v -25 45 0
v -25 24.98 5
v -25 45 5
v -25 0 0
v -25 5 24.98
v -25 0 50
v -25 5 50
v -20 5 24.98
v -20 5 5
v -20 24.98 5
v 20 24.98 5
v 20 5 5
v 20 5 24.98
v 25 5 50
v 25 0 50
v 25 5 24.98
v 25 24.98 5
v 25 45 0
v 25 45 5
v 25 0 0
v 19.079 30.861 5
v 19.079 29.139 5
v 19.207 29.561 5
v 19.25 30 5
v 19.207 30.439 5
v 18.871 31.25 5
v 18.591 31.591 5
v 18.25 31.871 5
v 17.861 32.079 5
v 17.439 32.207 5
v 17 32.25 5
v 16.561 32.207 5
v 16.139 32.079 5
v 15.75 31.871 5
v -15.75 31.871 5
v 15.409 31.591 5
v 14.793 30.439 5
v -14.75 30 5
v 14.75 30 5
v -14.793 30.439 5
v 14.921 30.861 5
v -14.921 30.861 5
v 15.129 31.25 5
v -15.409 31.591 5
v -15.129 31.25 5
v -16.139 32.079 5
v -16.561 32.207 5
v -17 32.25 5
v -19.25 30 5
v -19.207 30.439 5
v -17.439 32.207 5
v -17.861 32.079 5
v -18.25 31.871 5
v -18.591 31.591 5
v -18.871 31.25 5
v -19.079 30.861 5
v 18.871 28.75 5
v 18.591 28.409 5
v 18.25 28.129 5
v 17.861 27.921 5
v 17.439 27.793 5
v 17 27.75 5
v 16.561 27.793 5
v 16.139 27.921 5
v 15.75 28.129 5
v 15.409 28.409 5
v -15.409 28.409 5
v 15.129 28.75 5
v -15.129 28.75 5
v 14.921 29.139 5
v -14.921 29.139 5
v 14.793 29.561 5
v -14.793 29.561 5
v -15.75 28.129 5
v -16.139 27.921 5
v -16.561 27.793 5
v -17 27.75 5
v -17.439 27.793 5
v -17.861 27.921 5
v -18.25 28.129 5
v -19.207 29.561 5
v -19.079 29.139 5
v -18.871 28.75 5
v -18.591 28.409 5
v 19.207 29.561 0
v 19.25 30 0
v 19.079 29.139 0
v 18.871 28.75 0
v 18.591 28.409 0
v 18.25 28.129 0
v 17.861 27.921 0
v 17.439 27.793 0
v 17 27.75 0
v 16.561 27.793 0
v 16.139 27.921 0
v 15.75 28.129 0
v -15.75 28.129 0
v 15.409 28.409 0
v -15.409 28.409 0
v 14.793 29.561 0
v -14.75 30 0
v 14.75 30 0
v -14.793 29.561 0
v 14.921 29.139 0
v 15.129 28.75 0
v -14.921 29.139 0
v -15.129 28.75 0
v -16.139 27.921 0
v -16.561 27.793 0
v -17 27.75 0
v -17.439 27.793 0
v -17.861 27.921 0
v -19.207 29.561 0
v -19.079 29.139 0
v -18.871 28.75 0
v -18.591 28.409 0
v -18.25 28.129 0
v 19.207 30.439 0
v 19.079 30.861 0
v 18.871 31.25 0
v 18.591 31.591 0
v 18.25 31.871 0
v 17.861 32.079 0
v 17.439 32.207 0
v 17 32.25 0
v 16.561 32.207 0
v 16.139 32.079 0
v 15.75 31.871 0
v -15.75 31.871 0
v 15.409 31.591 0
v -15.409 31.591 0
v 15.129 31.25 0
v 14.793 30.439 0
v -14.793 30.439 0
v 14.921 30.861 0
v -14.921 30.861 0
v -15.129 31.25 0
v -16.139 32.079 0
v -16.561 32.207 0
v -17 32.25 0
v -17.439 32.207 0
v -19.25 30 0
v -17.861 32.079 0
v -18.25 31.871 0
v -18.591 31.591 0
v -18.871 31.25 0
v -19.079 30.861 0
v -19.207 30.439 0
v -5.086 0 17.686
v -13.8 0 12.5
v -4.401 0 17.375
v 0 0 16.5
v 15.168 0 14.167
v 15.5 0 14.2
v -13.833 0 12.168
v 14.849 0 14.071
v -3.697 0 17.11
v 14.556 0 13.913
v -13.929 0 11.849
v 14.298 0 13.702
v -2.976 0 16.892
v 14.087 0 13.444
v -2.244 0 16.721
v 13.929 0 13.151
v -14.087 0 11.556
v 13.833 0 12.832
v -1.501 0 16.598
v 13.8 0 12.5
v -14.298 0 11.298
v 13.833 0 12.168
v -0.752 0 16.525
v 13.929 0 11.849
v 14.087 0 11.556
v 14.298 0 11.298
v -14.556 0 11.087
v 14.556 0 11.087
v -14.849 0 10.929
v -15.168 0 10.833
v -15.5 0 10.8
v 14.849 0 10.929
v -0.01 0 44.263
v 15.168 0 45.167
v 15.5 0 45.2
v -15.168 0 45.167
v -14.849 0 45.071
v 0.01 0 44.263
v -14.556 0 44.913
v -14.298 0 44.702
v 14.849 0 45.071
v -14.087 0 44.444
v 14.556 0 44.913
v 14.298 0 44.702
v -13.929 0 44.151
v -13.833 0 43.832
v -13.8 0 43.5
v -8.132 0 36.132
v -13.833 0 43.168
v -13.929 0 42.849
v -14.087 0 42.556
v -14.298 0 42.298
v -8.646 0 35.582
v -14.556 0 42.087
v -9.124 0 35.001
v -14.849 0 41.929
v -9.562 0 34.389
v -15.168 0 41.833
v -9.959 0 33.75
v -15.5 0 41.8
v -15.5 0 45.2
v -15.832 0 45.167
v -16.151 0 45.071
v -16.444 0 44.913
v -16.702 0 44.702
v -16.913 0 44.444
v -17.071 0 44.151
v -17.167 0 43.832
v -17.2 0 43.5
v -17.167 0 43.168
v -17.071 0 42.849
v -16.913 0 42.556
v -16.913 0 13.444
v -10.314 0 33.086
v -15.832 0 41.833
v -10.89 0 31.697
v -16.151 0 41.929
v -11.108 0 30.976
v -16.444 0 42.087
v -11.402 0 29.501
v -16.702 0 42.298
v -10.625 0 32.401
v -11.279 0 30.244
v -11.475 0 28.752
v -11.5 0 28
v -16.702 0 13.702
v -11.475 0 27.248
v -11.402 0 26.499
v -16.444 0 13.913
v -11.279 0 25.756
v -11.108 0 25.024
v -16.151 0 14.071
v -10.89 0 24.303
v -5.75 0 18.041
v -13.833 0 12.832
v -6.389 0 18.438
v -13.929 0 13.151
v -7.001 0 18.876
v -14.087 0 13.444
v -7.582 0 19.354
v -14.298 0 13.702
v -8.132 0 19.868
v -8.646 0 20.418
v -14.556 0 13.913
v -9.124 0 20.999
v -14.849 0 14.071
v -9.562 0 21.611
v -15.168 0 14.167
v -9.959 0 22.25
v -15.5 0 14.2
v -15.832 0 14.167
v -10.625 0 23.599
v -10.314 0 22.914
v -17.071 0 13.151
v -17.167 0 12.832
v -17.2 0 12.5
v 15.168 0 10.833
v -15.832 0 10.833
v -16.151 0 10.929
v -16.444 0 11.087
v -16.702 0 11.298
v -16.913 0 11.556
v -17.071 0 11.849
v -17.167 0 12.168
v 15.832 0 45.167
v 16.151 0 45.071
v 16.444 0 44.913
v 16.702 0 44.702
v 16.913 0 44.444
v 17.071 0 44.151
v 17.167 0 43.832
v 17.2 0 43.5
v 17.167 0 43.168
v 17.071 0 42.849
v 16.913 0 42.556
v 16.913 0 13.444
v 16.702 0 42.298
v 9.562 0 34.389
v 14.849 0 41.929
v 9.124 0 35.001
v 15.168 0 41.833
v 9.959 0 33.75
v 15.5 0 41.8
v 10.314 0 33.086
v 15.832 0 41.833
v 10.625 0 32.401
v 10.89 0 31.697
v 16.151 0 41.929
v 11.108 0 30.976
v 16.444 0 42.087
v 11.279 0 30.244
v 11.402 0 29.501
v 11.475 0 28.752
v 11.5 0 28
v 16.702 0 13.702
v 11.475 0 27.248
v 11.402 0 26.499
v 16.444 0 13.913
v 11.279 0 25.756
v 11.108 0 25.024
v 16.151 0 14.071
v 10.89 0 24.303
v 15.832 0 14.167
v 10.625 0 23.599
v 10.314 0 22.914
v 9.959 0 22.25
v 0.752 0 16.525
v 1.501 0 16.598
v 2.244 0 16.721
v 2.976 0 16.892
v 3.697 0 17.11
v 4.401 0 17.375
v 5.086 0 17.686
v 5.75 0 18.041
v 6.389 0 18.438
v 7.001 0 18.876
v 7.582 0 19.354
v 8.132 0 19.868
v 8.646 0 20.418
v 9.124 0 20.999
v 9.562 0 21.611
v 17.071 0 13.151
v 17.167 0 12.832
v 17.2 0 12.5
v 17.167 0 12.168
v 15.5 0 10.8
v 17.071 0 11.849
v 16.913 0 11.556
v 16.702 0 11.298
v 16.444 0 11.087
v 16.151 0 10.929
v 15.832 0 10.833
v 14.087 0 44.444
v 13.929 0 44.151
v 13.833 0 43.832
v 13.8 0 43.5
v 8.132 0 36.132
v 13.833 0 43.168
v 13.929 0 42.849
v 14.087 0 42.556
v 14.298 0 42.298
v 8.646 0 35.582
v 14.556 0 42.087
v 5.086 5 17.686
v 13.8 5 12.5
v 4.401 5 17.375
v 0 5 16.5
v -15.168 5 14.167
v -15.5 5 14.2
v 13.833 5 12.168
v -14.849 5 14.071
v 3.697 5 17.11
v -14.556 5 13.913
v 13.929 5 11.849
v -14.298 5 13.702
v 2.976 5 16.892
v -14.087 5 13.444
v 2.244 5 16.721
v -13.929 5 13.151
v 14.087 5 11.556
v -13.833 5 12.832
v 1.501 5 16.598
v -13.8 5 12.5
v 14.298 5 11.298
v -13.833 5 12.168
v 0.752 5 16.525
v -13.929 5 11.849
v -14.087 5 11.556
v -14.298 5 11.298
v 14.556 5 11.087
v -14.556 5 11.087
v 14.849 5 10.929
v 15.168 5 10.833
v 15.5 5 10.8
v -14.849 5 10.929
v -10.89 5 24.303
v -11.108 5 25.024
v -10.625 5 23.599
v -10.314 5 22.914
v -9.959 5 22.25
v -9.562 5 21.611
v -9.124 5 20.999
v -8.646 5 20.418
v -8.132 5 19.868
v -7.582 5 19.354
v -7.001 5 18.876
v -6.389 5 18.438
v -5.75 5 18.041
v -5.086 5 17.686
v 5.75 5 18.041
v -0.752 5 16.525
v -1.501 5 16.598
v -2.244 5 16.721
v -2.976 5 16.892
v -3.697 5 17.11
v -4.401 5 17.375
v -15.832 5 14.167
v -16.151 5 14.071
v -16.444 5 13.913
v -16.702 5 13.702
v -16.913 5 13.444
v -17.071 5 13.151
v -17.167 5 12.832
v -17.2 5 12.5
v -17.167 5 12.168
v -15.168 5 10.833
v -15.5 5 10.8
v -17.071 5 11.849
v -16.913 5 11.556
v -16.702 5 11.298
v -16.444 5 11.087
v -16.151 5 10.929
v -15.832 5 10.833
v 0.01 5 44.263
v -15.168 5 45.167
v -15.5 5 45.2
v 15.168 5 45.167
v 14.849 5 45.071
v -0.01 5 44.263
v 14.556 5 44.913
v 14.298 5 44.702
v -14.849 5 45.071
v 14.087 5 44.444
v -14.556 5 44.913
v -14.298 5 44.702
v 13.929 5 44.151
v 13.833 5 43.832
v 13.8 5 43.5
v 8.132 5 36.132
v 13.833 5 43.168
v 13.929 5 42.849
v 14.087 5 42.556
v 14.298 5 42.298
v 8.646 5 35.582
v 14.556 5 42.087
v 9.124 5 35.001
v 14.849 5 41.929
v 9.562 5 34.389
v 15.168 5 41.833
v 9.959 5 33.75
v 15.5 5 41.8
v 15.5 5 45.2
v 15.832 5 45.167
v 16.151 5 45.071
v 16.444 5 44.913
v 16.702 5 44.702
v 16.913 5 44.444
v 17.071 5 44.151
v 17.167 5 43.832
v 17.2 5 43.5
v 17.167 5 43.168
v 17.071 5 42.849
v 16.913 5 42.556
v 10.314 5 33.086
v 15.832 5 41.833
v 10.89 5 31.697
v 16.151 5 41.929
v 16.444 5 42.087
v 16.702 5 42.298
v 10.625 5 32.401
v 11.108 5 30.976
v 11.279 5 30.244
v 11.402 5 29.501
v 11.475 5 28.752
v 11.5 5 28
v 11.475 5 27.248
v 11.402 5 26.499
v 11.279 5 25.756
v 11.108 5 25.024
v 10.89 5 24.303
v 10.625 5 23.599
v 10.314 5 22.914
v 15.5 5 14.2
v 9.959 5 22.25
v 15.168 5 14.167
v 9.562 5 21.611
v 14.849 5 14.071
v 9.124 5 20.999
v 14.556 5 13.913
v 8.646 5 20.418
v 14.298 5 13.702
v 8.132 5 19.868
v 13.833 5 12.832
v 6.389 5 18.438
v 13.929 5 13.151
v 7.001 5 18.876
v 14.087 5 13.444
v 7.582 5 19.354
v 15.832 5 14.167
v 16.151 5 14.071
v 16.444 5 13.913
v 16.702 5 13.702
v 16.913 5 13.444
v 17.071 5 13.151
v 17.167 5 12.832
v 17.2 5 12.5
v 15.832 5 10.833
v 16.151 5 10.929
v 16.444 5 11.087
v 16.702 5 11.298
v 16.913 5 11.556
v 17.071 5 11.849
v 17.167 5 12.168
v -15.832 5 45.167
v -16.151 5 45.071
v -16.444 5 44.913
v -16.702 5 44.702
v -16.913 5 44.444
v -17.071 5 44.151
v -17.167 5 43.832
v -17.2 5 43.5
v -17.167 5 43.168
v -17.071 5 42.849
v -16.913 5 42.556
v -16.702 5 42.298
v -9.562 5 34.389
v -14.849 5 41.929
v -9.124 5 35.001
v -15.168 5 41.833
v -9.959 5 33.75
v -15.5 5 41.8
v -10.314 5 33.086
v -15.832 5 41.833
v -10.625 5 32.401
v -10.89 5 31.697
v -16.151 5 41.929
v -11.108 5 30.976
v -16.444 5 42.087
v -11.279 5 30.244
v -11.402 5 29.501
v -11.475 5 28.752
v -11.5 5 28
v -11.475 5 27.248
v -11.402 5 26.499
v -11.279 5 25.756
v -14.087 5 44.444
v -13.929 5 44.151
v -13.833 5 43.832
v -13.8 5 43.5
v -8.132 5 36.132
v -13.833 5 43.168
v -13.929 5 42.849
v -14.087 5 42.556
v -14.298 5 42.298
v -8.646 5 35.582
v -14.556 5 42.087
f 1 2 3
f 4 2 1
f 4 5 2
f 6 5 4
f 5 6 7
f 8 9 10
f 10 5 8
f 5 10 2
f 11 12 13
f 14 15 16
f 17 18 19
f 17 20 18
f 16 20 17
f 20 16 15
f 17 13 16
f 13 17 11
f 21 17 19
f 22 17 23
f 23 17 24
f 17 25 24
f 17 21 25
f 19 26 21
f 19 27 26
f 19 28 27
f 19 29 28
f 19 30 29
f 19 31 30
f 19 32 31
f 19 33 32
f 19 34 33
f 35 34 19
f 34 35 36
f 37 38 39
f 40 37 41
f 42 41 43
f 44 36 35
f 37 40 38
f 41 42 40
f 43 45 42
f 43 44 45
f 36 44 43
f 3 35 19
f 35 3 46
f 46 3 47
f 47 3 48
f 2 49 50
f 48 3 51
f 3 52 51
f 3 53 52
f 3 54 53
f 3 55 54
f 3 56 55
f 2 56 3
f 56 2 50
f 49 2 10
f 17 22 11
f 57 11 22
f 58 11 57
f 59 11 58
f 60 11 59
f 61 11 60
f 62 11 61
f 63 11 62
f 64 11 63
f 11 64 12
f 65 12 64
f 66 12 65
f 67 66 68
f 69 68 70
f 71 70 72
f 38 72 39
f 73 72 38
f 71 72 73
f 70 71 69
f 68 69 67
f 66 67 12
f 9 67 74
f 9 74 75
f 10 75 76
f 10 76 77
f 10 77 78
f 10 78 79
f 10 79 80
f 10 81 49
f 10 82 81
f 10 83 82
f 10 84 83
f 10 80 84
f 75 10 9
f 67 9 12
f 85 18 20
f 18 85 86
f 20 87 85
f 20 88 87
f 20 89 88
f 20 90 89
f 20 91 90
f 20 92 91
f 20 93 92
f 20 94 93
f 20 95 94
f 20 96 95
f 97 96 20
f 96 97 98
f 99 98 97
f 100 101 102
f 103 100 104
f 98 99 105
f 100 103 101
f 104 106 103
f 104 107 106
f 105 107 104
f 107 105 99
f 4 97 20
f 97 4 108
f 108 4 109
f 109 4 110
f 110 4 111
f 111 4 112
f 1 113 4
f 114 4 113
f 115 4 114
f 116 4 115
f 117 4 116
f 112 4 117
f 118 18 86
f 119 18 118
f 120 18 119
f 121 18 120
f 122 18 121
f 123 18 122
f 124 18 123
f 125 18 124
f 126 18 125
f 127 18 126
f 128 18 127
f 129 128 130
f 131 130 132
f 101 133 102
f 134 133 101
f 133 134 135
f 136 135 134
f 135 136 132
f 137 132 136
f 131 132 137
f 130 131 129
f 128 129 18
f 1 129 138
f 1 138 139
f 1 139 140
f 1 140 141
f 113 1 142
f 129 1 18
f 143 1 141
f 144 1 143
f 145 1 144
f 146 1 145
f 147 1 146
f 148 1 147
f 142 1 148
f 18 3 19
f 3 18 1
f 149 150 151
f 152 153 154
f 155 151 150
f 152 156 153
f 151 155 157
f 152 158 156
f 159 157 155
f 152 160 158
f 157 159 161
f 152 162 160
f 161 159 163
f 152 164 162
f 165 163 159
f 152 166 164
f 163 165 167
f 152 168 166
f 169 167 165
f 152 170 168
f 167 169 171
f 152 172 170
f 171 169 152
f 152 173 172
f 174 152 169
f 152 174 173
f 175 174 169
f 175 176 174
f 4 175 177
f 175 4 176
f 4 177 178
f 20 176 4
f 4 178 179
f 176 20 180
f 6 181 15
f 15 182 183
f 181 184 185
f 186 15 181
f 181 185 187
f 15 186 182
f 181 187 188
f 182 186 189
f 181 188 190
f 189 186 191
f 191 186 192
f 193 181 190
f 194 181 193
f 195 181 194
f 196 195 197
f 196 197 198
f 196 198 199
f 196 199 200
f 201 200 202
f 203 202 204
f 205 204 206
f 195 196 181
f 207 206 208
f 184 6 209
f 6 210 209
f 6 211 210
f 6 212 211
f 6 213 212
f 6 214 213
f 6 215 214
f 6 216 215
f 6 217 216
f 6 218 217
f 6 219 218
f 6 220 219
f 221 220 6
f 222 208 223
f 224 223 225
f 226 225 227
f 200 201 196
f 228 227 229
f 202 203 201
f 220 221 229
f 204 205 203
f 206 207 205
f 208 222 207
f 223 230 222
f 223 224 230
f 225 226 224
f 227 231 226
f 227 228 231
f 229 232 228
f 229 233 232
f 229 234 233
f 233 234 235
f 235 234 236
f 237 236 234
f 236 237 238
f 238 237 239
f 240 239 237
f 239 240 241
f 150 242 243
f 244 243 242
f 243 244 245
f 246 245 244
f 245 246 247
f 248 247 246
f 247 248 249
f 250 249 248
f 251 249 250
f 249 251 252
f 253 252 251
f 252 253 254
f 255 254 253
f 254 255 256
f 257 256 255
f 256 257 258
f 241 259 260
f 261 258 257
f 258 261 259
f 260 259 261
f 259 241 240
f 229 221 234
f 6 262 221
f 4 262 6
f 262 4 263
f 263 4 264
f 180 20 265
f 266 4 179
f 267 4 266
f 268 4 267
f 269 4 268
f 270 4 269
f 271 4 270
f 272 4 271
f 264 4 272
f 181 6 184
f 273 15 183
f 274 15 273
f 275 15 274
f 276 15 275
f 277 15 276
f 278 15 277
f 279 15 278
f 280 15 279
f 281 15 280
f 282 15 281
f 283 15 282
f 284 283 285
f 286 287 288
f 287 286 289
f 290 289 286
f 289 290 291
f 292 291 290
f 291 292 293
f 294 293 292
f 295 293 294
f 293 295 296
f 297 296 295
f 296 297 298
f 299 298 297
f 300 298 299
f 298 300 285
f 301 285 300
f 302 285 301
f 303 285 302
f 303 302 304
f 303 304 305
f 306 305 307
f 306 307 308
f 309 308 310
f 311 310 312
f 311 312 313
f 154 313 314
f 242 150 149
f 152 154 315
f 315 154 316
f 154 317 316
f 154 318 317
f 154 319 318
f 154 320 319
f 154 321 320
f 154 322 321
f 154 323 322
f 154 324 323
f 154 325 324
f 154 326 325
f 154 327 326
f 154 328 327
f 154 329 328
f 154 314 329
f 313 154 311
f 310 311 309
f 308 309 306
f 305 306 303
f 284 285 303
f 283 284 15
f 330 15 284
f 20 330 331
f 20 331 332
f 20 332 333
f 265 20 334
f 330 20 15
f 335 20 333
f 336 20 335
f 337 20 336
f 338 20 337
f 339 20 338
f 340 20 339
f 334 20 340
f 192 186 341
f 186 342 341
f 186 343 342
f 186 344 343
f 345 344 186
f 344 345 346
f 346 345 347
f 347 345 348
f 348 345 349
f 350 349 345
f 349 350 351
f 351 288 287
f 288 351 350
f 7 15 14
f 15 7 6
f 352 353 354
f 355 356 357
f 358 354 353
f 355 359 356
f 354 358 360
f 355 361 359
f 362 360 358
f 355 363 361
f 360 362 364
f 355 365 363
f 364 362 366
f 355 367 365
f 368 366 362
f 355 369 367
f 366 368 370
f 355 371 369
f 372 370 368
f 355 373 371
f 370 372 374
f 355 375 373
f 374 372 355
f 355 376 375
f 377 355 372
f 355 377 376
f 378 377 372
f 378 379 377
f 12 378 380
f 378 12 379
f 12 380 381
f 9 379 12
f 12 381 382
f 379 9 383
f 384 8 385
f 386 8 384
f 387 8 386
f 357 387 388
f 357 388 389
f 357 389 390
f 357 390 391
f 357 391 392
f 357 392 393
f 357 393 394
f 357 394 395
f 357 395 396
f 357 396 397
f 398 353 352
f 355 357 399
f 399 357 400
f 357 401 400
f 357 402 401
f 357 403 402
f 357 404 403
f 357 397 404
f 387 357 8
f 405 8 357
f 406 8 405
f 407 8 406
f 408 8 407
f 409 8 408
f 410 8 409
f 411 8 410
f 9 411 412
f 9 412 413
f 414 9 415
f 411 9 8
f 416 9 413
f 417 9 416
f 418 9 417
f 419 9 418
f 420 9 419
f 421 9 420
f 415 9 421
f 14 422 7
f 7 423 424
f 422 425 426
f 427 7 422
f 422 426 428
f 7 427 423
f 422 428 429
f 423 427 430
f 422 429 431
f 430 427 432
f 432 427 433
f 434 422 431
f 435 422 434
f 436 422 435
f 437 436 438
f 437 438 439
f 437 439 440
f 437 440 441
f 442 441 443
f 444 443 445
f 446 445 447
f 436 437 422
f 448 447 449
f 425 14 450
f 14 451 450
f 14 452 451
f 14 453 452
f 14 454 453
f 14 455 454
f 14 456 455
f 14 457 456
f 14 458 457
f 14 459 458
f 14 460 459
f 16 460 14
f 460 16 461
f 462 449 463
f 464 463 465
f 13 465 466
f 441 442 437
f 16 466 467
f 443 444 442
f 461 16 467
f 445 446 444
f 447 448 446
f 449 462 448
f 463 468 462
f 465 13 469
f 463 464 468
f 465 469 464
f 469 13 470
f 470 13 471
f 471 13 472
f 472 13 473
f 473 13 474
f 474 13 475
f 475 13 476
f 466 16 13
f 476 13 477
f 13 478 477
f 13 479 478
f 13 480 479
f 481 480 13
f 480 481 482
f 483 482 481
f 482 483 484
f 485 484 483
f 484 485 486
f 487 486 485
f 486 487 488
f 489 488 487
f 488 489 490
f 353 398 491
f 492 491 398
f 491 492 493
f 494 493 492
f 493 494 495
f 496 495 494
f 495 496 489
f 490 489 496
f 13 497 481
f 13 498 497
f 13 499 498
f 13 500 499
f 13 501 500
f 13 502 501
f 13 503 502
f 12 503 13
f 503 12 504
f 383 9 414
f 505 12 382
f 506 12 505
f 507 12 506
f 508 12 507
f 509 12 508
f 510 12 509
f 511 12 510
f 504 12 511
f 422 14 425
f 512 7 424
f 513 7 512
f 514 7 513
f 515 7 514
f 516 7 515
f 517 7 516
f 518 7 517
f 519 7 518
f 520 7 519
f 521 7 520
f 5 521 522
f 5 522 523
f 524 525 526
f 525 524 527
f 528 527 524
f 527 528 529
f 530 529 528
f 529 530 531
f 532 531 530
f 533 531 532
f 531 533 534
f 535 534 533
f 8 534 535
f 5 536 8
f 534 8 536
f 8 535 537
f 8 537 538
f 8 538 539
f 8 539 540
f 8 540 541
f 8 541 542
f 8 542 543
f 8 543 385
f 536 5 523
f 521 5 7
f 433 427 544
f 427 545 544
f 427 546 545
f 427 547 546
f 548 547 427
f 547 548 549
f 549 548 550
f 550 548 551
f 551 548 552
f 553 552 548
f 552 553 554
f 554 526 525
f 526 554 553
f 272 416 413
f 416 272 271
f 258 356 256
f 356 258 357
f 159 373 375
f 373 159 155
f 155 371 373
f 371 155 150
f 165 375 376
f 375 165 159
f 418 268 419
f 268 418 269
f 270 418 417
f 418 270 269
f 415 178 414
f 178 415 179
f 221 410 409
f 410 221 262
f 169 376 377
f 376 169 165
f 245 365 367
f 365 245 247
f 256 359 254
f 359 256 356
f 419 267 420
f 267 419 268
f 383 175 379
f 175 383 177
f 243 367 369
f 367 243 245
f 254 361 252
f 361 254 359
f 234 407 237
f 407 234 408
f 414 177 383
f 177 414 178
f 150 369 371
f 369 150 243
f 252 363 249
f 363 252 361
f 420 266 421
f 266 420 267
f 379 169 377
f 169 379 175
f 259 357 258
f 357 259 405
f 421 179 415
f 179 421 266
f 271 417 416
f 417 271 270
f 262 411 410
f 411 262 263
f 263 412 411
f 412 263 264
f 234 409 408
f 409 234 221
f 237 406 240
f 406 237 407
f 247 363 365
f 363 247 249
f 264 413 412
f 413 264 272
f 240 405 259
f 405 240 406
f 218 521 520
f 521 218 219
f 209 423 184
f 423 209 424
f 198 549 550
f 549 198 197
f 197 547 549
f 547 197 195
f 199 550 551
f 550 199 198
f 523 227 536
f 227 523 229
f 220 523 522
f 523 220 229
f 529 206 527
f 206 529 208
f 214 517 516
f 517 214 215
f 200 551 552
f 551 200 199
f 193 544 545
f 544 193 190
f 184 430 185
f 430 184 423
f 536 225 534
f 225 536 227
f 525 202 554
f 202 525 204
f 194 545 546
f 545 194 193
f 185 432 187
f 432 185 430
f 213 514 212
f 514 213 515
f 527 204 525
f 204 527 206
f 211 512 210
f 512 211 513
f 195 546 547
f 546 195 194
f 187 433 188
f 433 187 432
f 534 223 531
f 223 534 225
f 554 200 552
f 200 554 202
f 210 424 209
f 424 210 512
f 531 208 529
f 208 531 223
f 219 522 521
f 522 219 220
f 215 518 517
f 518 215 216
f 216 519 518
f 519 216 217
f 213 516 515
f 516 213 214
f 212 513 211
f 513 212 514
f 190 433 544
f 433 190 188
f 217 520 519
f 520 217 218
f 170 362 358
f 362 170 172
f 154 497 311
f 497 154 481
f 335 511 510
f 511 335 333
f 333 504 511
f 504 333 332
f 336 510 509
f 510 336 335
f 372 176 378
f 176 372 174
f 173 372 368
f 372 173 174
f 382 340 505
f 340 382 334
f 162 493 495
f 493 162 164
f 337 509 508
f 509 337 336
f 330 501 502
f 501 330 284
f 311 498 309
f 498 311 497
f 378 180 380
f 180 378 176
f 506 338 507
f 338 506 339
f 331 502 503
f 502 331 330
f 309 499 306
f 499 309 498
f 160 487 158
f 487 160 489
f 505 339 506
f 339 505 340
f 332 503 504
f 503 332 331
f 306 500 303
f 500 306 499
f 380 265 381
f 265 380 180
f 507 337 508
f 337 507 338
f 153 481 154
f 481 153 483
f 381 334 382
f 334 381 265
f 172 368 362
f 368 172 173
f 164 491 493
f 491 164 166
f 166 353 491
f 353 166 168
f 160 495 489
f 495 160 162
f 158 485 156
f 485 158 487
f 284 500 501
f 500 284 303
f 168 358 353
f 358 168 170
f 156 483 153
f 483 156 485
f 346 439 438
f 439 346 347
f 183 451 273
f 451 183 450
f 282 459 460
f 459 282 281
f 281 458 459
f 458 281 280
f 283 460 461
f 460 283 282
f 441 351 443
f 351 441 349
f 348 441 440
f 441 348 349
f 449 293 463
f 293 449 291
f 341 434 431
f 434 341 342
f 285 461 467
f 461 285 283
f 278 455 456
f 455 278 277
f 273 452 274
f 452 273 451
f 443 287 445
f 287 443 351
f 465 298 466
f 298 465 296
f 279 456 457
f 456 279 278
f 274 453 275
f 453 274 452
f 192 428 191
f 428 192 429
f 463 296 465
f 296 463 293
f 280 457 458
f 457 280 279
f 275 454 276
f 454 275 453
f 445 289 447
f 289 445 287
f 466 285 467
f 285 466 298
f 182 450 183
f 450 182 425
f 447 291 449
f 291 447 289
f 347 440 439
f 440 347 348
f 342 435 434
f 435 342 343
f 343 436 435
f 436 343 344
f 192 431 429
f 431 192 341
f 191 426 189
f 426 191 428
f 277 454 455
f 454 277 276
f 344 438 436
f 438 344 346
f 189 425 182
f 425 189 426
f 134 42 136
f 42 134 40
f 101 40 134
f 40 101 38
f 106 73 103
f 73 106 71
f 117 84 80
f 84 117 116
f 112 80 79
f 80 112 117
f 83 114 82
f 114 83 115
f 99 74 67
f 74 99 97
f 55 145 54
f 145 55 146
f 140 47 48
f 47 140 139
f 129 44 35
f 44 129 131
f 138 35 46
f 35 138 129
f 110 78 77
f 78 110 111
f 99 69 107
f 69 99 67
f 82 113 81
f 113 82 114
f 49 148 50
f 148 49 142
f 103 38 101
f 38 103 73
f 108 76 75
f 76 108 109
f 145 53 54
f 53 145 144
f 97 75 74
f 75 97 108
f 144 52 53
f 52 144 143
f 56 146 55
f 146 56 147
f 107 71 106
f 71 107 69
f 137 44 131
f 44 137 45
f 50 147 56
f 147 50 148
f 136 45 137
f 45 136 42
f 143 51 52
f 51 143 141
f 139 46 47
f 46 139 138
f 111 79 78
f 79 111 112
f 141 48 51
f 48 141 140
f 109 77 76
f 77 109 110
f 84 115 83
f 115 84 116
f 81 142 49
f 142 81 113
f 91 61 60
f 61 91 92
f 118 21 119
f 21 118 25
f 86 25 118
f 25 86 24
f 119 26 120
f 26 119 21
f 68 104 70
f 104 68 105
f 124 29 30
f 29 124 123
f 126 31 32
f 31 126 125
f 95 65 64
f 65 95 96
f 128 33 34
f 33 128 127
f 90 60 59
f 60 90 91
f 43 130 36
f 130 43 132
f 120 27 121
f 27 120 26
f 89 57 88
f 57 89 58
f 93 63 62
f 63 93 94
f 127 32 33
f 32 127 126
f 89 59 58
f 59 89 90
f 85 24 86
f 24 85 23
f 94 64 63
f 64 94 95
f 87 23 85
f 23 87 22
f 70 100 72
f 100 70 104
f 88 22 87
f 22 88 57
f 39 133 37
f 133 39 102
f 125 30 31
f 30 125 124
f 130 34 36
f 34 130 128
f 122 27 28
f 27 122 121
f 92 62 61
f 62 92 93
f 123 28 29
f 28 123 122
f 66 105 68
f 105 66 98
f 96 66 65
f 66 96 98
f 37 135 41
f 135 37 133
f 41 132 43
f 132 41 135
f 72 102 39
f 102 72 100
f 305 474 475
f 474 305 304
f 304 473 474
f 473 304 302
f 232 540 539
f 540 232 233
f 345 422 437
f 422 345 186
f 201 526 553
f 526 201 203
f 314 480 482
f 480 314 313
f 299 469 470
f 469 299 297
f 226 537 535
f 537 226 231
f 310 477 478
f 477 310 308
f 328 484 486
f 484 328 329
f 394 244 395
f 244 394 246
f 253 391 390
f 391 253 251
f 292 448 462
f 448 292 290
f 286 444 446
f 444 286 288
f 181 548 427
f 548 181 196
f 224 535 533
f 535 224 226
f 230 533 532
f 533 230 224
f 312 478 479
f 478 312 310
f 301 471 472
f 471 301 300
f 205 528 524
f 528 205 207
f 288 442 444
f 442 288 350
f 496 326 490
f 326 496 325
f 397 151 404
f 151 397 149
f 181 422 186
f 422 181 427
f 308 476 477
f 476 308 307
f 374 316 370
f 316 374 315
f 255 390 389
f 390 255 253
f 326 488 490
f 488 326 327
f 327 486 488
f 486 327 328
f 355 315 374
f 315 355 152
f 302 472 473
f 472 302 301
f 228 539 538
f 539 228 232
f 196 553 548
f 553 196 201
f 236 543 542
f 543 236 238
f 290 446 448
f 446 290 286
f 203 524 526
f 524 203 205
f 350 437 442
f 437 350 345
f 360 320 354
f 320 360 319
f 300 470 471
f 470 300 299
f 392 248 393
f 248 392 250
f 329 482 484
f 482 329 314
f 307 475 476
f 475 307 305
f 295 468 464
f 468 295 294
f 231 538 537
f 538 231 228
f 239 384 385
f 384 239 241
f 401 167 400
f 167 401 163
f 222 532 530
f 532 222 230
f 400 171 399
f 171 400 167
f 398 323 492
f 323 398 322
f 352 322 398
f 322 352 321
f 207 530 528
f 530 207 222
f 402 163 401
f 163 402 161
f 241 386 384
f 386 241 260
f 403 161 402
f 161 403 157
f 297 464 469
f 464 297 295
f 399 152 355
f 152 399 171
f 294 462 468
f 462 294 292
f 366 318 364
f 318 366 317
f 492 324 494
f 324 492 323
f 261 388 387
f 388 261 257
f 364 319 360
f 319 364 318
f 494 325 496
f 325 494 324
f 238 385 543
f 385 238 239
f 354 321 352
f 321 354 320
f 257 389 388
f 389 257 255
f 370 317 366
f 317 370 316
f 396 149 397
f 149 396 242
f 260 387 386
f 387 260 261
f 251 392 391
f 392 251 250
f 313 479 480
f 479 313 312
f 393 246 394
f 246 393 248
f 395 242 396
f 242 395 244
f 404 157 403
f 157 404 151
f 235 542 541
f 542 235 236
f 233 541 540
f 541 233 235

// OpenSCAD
// L-bracket for a NEMA 17 stepper motor (syringe pumps, peristaltic pumps, shakers)
// Category: full hardware. Base plate with two M4 holes, vertical motor plate with
// the 22 mm boss hole + 31 mm M3 pattern, two gussets. Motor body mounts on the
// back (-Y) side, shaft pointing over the base - screw the base down before mounting
// the motor, or the bracket tips backwards.
// The boss hole has a 45 deg teardrop top so its crown prints without sagging onto
// the motor's centring boss; check that the boss fits before final assembly.
// Print: PETG, base on the bed, 0.2 mm layers, 5 perimeters, 30 % infill.
// SPDX-License-Identifier: CERN-OHL-P-2.0

/* [Bracket] */
// X, Y, Z: spans y = 0..45
base = [50, 45, 5];
// vertical plate at y = 0..5
plate = [50, 5, 50];
// NEMA 17 centring boss is 22 mm
boss_d = 23;
// motor axis height
boss_z = 28;
// M3 clearance
screw_d = 3.4; // 0.1
// NEMA 17 bolt pattern
screw_spacing = 31;
// M4 clearance
mount_d = 4.5; // 0.1
// the two M4 holes in the base sit at x = -mount_x and +mount_x, y = mount_y
mount_x = 17;
mount_y = 30;
gusset_t = 5;
gusset_len = 20;

/* [Hidden] */
eps = 0.01;

// parameter checks: stop with a message instead of building a broken part
assert(screw_spacing / 2 + screw_d / 2 <= plate.x / 2 - 0.8, "the motor screw holes do not fit the plate width");
assert(boss_z - screw_spacing / 2 - screw_d / 2 >= base.z, "the lower motor screws cut into the base: raise boss_z");
assert(boss_z + screw_spacing / 2 + screw_d / 2 <= plate.z - 0.8, "the upper motor screws run off the plate: lower boss_z or raise plate.z");
assert(mount_x + mount_d / 2 <= base.x / 2 - 0.8 && mount_y + mount_d / 2 <= base.y - 0.8, "the M4 holes run off the base: move them in or enlarge the base");
assert(mount_y - mount_d / 2 >= plate.y + gusset_len + 0.8 || mount_x + mount_d / 2 <= base.x / 2 - gusset_t - 0.8, "the M4 holes cut into the gussets: move them");
assert(base.x / 2 - gusset_t >= screw_spacing / 2 + 3, "the gussets cover the motor screw heads: widen the base or thin the gussets");

difference() {
    union() {
        translate([-base.x / 2, 0, 0]) cube(base);
        translate([-plate.x / 2, 0, 0]) cube(plate);
        for (sx = [-1, 1])
            translate([sx * (base.x / 2 - gusset_t / 2) - gusset_t / 2, plate.y - eps, base.z - eps])
                rotate([90, 0, 90]) linear_extrude(gusset_t)
                    polygon([[0, 0], [gusset_len, 0], [0, gusset_len]]);
    }
    // teardrop: circle + 45 deg roof, extruded through the plate along Y
    translate([0, plate.y + 1, boss_z]) rotate([90, 0, 0])
        linear_extrude(plate.y + 2)
            hull() {
                circle(d = boss_d, $fn = 96);
                translate([0, boss_d / 2 * sqrt(2) - 0.01]) square(0.02, center = true);
            }
    for (sx = [-1, 1], sz = [-1, 1])
        translate([sx * screw_spacing / 2, -1, boss_z + sz * screw_spacing / 2])
            rotate([-90, 0, 0]) cylinder(d = screw_d, h = plate.y + 2, $fn = 32);
    for (sx = [-1, 1])
        translate([sx * mount_x, mount_y, -1]) cylinder(d = mount_d, h = base.z + 2, $fn = 32);
}
